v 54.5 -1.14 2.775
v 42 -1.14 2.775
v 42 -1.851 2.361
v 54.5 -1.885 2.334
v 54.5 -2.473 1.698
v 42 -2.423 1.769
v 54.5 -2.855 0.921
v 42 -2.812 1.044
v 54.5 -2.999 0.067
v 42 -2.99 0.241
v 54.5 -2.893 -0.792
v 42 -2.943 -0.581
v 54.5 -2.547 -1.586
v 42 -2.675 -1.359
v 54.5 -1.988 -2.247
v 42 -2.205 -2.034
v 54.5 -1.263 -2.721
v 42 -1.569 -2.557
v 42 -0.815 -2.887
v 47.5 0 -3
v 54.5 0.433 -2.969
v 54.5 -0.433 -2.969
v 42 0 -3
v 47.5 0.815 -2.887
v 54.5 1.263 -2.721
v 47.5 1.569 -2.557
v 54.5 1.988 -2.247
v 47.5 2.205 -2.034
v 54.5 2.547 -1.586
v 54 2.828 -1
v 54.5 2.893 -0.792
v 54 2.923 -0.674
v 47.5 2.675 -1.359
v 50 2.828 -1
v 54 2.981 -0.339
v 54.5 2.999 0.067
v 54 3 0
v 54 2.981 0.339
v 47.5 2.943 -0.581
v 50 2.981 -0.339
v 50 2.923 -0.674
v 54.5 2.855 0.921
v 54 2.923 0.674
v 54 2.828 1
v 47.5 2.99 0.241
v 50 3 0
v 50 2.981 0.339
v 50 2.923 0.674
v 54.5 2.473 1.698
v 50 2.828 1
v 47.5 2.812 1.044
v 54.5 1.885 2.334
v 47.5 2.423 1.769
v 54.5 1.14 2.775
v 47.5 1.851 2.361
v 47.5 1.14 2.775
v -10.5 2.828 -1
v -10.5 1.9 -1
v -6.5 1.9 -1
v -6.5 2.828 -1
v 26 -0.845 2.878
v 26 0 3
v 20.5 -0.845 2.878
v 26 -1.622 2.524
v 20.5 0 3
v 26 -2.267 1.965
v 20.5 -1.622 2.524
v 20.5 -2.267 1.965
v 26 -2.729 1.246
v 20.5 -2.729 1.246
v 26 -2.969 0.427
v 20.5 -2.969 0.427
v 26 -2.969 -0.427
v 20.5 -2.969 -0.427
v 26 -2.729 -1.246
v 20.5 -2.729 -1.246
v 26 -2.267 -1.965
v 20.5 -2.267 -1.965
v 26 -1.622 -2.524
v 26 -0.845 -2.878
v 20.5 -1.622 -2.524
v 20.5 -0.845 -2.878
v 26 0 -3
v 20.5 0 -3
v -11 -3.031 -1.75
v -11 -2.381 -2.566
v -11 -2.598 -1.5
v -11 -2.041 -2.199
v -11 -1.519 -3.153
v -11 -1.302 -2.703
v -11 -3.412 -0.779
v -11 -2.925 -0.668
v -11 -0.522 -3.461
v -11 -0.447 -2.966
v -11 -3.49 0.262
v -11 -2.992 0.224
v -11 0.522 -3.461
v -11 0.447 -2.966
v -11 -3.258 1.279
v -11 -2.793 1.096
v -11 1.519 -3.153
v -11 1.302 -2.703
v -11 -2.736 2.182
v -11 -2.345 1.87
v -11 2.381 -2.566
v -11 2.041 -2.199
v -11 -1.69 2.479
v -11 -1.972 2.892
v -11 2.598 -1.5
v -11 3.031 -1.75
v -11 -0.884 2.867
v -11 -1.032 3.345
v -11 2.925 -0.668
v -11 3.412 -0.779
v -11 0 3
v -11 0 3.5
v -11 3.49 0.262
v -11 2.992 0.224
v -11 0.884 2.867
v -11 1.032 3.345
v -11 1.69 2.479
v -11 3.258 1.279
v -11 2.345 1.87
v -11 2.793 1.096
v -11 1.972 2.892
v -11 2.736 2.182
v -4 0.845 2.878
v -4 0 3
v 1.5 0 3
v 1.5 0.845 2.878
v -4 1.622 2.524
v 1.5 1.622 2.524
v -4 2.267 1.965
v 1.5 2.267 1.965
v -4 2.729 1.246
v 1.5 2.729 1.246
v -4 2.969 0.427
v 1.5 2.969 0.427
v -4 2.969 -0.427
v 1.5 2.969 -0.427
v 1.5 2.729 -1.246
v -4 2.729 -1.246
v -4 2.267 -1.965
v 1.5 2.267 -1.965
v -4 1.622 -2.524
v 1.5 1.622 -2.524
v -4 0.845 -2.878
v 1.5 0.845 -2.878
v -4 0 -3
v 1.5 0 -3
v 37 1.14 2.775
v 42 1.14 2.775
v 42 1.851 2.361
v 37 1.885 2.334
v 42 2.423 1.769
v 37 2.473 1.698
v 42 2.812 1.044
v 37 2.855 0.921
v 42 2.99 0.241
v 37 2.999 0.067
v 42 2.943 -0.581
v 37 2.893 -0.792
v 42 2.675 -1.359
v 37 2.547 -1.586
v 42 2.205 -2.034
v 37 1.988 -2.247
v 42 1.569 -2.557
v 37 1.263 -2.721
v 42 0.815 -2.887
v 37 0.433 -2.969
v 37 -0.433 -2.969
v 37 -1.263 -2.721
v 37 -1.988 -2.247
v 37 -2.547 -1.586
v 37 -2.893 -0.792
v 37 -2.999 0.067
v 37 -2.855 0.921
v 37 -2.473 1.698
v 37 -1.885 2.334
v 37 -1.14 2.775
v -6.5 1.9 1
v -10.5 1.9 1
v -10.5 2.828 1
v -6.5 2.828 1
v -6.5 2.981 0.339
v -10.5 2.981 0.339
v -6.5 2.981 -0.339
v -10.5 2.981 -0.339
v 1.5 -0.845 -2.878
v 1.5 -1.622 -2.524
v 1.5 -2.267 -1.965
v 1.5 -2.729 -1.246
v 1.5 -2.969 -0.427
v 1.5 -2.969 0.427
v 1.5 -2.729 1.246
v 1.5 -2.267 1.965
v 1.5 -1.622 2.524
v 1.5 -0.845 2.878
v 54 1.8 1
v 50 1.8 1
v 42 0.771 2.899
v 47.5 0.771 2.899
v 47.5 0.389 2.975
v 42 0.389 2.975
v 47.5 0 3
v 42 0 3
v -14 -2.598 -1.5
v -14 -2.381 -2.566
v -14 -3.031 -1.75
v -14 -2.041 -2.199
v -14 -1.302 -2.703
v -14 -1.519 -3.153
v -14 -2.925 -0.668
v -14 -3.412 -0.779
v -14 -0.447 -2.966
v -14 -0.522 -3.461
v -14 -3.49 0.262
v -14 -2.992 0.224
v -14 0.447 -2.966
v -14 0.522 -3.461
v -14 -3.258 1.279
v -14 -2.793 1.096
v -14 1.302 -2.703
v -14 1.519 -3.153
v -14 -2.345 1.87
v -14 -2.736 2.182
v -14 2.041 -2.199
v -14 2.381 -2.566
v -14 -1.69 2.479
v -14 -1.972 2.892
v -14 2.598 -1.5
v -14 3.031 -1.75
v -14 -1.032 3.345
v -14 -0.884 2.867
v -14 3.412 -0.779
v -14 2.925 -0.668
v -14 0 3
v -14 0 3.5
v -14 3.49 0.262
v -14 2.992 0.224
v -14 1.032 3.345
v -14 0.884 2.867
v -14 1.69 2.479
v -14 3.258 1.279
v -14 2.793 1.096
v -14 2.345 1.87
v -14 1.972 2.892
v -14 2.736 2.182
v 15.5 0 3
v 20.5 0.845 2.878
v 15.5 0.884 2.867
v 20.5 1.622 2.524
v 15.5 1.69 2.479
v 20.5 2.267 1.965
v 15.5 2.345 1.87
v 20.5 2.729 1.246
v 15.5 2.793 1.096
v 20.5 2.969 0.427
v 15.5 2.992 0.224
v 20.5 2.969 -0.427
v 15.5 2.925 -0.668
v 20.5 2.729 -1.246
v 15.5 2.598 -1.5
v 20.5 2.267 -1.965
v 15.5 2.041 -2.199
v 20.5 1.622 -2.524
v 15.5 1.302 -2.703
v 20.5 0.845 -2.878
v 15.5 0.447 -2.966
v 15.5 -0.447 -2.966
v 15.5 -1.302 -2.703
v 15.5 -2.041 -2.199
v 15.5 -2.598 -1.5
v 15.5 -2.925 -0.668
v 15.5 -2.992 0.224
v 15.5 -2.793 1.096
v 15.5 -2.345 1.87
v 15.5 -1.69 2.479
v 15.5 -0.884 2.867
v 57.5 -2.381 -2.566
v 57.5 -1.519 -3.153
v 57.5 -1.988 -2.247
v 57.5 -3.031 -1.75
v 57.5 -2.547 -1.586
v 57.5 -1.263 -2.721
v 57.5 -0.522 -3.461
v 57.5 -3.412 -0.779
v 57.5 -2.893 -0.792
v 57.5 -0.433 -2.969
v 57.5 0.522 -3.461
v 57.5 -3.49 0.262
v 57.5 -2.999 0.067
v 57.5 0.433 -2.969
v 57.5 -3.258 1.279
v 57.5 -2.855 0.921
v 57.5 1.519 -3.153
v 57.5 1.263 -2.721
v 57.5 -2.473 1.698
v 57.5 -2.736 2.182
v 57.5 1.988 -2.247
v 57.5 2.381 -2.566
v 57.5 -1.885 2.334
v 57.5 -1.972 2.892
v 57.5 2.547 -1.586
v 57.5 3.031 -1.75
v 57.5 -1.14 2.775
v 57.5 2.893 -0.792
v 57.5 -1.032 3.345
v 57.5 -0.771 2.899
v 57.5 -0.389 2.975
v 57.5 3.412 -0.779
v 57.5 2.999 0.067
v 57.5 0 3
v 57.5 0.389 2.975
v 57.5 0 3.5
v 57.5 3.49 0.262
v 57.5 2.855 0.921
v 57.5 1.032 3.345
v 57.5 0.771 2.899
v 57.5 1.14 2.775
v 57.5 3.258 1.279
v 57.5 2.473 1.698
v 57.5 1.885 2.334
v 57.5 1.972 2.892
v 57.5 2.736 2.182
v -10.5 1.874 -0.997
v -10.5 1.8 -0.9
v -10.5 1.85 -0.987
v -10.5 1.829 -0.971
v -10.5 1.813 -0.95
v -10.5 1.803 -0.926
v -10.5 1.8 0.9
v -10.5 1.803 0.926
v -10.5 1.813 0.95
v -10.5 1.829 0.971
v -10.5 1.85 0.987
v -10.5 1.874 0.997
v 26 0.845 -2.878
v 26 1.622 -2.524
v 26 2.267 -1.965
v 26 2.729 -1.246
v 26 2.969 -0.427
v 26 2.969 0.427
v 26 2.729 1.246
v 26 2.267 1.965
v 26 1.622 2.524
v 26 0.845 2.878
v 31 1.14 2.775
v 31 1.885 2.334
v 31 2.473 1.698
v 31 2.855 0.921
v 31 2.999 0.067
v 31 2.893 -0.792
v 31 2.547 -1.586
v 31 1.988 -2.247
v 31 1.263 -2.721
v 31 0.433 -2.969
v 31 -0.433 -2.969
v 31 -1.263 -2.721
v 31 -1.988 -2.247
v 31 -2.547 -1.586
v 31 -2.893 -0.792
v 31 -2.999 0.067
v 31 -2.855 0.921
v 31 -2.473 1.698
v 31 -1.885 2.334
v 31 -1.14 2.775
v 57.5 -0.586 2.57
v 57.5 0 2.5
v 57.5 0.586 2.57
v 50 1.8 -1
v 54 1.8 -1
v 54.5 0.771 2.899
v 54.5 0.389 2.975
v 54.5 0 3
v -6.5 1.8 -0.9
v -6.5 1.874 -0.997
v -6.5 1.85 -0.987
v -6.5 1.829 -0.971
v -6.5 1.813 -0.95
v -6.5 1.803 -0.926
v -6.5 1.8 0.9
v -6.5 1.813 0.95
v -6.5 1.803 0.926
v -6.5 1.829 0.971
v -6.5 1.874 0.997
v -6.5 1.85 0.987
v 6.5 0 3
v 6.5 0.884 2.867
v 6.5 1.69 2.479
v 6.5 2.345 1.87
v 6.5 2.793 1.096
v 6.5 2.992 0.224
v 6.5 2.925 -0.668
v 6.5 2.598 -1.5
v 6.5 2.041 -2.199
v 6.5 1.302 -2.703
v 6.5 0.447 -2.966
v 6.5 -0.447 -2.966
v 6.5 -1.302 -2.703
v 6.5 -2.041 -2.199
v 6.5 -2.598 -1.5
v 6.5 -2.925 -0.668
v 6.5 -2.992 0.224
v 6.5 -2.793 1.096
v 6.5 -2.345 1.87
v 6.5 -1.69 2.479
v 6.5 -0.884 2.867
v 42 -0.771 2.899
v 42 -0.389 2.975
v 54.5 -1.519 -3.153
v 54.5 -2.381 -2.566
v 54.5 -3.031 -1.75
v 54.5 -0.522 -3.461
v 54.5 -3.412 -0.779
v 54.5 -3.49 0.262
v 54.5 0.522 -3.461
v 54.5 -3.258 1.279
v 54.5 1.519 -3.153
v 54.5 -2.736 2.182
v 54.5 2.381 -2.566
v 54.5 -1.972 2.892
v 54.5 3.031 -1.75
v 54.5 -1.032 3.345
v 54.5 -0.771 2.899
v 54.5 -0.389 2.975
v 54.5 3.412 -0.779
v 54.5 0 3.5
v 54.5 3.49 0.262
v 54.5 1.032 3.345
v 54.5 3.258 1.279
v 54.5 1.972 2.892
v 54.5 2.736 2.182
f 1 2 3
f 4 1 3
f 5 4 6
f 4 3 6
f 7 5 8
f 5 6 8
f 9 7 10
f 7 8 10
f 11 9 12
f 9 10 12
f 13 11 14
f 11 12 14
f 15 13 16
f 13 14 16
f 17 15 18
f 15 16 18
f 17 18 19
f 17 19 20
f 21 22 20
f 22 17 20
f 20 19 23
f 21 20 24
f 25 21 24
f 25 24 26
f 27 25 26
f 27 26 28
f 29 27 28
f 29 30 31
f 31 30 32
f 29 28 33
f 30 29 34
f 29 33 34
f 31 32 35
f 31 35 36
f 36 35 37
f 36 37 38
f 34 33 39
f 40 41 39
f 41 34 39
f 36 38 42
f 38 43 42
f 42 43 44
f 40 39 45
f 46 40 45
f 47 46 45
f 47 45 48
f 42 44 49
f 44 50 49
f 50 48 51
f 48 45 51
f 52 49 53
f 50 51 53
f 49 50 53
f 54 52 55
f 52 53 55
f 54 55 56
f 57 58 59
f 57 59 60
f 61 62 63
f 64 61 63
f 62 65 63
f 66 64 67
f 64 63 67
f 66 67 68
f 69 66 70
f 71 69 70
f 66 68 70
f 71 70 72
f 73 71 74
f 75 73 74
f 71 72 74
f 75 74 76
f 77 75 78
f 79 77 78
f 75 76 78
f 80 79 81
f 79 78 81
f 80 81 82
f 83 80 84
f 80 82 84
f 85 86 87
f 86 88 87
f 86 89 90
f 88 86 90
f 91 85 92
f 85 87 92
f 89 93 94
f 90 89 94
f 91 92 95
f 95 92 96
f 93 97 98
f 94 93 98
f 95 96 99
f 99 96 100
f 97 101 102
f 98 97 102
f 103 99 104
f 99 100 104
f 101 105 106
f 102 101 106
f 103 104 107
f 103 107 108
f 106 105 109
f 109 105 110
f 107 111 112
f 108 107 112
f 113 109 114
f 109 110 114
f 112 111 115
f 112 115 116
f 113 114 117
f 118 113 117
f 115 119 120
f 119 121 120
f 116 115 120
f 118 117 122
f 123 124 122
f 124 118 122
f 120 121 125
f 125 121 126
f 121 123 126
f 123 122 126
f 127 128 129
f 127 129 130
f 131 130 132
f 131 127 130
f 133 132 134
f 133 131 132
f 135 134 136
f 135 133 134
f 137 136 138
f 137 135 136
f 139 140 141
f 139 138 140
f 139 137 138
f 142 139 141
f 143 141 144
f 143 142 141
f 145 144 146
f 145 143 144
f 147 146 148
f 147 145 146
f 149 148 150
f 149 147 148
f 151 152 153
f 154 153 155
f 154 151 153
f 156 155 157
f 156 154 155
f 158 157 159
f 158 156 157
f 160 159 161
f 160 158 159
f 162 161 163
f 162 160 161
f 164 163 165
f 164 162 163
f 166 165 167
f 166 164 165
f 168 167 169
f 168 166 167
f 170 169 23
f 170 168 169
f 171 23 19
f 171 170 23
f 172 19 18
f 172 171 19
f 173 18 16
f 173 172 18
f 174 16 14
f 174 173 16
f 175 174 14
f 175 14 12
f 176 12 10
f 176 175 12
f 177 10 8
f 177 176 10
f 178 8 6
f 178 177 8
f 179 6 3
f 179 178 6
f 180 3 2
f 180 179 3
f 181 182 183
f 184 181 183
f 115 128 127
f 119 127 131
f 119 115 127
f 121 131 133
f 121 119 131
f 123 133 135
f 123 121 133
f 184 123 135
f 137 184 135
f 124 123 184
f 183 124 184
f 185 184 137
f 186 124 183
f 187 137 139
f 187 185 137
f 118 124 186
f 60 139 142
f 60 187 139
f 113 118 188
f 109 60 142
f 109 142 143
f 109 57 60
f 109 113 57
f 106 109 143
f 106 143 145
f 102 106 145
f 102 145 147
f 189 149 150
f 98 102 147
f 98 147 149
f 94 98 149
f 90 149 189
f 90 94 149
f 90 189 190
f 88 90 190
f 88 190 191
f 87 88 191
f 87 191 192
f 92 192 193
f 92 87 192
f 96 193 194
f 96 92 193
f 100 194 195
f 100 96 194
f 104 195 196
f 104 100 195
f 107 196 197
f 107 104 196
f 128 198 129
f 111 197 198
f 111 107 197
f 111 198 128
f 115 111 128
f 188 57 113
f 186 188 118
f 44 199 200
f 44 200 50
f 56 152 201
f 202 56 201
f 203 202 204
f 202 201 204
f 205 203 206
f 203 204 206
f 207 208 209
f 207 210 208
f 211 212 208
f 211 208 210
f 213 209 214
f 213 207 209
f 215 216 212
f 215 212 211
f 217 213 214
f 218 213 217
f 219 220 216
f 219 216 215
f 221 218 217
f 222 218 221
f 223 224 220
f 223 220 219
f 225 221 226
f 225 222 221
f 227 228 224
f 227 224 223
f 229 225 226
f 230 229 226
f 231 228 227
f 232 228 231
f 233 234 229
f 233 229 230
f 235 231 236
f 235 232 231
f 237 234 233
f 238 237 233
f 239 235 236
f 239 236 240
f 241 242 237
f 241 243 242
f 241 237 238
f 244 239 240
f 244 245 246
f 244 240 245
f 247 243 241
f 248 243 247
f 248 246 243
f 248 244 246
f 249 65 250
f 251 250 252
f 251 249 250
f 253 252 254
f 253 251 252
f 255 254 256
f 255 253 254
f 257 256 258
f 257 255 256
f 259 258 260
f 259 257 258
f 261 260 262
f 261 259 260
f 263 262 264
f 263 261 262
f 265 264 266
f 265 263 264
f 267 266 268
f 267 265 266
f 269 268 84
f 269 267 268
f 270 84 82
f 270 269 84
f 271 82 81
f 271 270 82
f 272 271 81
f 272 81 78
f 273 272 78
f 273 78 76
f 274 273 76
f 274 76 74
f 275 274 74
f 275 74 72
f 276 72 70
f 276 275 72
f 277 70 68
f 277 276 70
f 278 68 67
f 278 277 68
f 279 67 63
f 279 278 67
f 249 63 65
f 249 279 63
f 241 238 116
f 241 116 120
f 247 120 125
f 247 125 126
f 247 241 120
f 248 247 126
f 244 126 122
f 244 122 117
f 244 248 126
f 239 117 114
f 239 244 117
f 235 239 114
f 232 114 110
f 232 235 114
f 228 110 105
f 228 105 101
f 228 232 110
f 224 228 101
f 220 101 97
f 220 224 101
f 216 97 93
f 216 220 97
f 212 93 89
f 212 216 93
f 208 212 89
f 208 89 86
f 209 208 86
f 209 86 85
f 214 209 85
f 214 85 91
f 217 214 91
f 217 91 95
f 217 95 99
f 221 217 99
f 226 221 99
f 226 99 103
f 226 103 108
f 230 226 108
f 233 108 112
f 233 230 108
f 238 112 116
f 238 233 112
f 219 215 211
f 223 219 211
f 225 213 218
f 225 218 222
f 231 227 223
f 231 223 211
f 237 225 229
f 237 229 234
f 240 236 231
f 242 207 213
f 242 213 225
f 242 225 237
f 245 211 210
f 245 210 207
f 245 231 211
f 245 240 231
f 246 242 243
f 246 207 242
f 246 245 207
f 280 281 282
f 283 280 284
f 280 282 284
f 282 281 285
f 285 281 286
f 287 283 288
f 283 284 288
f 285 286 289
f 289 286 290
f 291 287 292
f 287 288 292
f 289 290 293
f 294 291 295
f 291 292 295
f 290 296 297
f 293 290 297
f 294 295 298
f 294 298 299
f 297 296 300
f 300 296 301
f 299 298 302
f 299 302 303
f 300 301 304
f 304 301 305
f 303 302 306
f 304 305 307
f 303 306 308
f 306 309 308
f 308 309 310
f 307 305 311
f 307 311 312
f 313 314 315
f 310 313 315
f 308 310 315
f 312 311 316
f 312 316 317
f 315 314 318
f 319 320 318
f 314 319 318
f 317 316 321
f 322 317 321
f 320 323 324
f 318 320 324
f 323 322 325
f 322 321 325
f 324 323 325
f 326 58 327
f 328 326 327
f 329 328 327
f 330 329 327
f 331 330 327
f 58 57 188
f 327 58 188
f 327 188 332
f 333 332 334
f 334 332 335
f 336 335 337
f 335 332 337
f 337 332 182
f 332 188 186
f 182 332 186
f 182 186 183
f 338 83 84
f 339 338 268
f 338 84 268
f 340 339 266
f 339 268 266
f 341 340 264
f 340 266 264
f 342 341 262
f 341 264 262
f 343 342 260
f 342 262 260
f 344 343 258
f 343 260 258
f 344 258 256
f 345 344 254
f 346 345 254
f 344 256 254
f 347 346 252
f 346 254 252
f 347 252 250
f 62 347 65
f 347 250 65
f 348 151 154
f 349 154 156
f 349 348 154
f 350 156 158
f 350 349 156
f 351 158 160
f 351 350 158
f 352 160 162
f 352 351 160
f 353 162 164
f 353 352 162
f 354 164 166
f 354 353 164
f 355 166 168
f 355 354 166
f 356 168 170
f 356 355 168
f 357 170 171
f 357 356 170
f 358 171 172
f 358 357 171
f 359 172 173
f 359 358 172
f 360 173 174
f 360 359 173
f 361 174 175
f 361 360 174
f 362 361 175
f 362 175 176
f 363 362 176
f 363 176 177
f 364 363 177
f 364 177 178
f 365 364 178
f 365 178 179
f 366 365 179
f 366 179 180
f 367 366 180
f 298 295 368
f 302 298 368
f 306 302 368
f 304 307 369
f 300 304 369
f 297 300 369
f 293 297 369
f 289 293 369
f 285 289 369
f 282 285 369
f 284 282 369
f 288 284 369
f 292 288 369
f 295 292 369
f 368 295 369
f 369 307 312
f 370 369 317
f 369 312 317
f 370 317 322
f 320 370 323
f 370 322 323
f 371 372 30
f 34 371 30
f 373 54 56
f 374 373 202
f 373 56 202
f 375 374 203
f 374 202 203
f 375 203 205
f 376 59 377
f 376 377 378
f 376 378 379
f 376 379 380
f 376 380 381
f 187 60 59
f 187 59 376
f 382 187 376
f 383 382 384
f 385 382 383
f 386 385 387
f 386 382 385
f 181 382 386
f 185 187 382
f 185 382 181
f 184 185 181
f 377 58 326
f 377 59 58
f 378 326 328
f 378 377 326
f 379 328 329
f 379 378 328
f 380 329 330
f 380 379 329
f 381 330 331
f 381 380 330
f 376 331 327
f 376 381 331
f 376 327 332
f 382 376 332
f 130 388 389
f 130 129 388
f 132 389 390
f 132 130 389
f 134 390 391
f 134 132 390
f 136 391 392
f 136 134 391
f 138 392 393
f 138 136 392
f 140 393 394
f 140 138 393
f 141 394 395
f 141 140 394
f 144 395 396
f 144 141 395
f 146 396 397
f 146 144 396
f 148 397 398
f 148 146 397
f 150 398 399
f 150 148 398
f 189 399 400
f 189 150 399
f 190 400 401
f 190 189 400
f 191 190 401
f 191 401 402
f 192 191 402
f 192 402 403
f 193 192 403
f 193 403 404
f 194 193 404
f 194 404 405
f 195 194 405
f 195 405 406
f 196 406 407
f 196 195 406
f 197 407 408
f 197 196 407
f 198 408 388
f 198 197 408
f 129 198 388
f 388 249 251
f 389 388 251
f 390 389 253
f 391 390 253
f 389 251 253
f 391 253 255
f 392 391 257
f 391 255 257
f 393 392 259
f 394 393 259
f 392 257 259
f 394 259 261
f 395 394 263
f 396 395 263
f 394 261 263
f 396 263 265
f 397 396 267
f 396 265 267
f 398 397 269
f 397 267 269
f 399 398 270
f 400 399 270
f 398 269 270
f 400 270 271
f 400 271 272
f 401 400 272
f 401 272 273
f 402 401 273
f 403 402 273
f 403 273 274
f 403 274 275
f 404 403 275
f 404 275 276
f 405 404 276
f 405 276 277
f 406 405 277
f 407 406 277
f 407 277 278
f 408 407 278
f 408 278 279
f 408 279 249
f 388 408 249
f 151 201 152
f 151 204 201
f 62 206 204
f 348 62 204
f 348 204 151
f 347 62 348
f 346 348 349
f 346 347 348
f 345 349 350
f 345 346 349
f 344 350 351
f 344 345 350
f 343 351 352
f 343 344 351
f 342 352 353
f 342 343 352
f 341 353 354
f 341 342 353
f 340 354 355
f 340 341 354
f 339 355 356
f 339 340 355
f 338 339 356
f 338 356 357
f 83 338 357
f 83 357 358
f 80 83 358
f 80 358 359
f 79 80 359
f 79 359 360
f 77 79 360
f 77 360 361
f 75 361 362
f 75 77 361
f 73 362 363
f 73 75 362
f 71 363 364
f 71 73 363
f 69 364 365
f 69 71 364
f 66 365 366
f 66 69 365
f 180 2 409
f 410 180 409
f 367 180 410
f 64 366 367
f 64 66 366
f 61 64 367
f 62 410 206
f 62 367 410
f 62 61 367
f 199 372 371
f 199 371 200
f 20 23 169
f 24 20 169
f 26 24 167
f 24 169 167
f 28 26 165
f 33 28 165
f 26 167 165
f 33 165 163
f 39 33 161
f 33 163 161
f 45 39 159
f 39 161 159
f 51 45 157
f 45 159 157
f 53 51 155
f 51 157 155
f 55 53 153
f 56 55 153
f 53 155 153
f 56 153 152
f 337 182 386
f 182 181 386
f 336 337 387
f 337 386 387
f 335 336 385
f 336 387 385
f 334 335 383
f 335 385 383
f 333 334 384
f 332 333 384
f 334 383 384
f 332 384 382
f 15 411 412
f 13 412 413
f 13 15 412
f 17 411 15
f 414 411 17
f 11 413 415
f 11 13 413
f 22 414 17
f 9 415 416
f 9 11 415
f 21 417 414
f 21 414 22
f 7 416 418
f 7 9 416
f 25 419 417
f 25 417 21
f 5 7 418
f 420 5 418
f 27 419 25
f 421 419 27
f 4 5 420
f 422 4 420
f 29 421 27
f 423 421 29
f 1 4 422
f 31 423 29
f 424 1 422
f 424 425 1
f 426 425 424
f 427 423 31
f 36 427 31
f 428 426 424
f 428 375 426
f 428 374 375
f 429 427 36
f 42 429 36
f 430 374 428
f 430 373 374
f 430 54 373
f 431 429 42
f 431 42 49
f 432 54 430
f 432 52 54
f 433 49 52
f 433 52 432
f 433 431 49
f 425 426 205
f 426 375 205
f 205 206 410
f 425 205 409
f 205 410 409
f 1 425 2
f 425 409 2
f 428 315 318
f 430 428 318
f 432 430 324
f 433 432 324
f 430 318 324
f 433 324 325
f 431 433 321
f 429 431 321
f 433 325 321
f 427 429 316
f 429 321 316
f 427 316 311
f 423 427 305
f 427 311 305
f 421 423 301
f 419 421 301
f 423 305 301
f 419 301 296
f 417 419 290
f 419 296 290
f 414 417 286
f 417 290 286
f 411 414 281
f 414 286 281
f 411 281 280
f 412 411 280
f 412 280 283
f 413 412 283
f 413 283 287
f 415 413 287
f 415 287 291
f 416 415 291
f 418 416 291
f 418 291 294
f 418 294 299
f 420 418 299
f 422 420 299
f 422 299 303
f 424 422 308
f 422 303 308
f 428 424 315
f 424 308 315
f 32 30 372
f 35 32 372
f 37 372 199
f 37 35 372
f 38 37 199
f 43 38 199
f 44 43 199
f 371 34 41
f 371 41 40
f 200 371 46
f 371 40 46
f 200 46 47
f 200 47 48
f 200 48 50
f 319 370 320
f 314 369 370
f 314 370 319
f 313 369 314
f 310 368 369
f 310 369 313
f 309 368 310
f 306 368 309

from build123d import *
from build123d.topology import SkipClean

# Parameters (mm, degrees)
SKETCH_2_R          = 3
EXTRUDE_1_DEPTH     = 4
EXTRUDE_2_DEPTH     = 2.5
SKETCH_5_R          = 2.5
EXTRUDE_3_DEPTH     = 9
MIRROR_START        = 15.5
MIRROR_1_DEPTH      = 0.381197772
MIRROR_START_2      = 15.881197772
MIRROR_1_2_DEPTH    = 4.618802228
EXTRUDE_4_DEPTH     = 5
SKETCH_10_R         = 2.5
EXTRUDE_5_DEPTH     = 6
SKETCH_11_R         = 3
EXTRUDE_6_DEPTH     = 5.5
EXTRUDE_START       = 10
SKETCH_12_R         = 3
EXTRUDE_8_DEPTH     = 10
SKETCH_13_R         = 3
EXTRUDE_9_DEPTH     = 10
SKETCH_14_OUTSIDE_W = 32.048
SKETCH_14_OUTSIDE_H = 35.048
SKETCH_14_OUTSIDE_R = 3
CUT_EXTRUDE_2_DEPTH = 59.352377883
SKETCH_15_R         = 3
EXTRUDE_10_DEPTH    = 29.5
EXTRUDE_11_DEPTH    = 26.5
CUT_EXTRUDE_START   = -3.5
SKETCH_17_W         = 2
SKETCH_17_H         = 1.2
CUT_EXTRUDE_3_DEPTH = 4
FILLET_1_R          = 0.1
SKETCH_18_R         = 3.5
EXTRUDE_12_DEPTH    = 3


with BuildPart() as part:
    # 草图2 → 凸台-拉伸1 (new, symmetric)
    with BuildSketch(Plane(origin=(0, 0, 0), x_dir=(0, 0, -1), z_dir=(1, 0, 0))):
        Circle(SKETCH_2_R)
    extrude_1 = extrude(amount=EXTRUDE_1_DEPTH, both=True)

    # 草图3 → 凸台-拉伸2 (add, symmetric)
    with BuildSketch(Plane(origin=(4, 0, 0), x_dir=(0, 0, -1), z_dir=(1, 0, 0))):
        with BuildLine():
            Line((5, 0), (5, -8))
            ThreePointArc((5, -8), (0, -13), (-5, -8))
            Line((-5, -8), (-5, 0))
            ThreePointArc((-5, 0), (0, 5), (5, 0))
        make_face()
    extrude(amount=EXTRUDE_2_DEPTH, both=True)

    # 切除-旋转1: read off the stored shape, not the designer's step
    # 切除-旋转1 outline → 切除-旋转1 (revolve, cut)
    with BuildSketch(Plane.YX):
        Polygon((13.0002322, 6.118936215), (4.99999958, 1.499999757), (13.0002322, 1.499999757), align=None)
    revolve(axis=Axis((0, 0, 0), (1, 0, 0)), mode=Mode.SUBTRACT)

    # 草图5 → 凸台-拉伸3 (add)
    with BuildSketch(Plane(origin=(6.5, 0, 0), x_dir=(0, 0, -1), z_dir=(1, 0, 0))):
        with Locations((0, -8)):
            Circle(SKETCH_5_R)
    extrude(amount=EXTRUDE_3_DEPTH)

    # 镜向1: read off the stored shape, not the designer's step
    # 镜向1 outline → 镜向1 (add)
    with BuildSketch(Plane.YZ.offset(MIRROR_START)):
        with BuildLine():
            Line((-8, -5), (0, -5))
            ThreePointArc((0, -5), (5, 0), (0, 5))
            Line((0, 5), (-7.999999997, 5))
            ThreePointArc((-7.999999997, 5), (-13, 2e-09), (-8, -5))
        make_face()
    extrude(amount=MIRROR_1_DEPTH)

    # Mirror 1 2 outline → Mirror 1 2 (add)
    with BuildSketch(Plane.YZ.offset(MIRROR_START_2)):
        with BuildLine():
            Line((-8, -5), (0, -5))
            ThreePointArc((0, -5), (5, 0), (0, 5))
            Line((0, 5), (-7.999999997, 5))
            ThreePointArc((-7.999999997, 5), (-13, 2e-09), (-8, -5))
        make_face()
    extrude(amount=MIRROR_1_2_DEPTH)

    # Mirror 1 3 outline → Mirror 1 3 (revolve, cut)
    with BuildSketch(Plane.YX):
        Polygon((13.0002322, 20.500000243), (4.99999958, 20.500000243), (13.0002322, 15.881063785), align=None)
    revolve(axis=Axis((0, 0, 0), (1, 0, 0)), mode=Mode.SUBTRACT)

    # 镜向2: 凸台-拉伸1 across plane
    add(extrude_1.mirror(Plane(origin=(11, 0, 0), x_dir=(0, 0, 1), z_dir=(1, 0, 0))))

    # 草图6 → 凸台-拉伸4 (add)
    with BuildSketch(Plane(origin=(26, 0, 0), x_dir=(0, 0, -1), z_dir=(1, 0, 0))):
        with BuildLine():
            Line((0, -5), (-5, -5))
            ThreePointArc((-5, -5), (-10, 0), (-5, 5))
            Line((-5, 5), (0, 5))
            ThreePointArc((0, 5), (5, 0), (0, -5))
        make_face()
    extrude_4 = extrude(amount=EXTRUDE_4_DEPTH)

    # 切除-旋转2: read off the stored shape, not the designer's step
    # 切除-旋转2 outline → 切除-旋转2 (revolve, cut)
    with BuildSketch(Plane.YX):
        Polygon((10.000264544, 30.195720135), (5, 26), (10.000264544, 26), align=None)
    cut_revolve_2 = revolve(axis=Axis((0, 0, 0), (1, 0, 0)), mode=Mode.SUBTRACT)

    # 草图10 → 凸台-拉伸5 (add)
    with BuildSketch(Plane(origin=(31, 0, 0), x_dir=(0, 0, -1), z_dir=(1, 0, 0))):
        with Locations((-5, 0)):
            Circle(SKETCH_10_R)
    extrude(amount=EXTRUDE_5_DEPTH)

    # 镜向3: 凸台-拉伸4, 切除-旋转2 across plane
    add(extrude_4.mirror(Plane(origin=(34, 0, 0), x_dir=(0, 0, 1), z_dir=(1, 0, 0))))
    add(cut_revolve_2.mirror(Plane(origin=(34, 0, 0), x_dir=(0, 0, 1), z_dir=(1, 0, 0))), mode=Mode.SUBTRACT)

    # 草图11 → 凸台-拉伸6 (add)
    with BuildSketch(Plane(origin=(42, 0, 0), x_dir=(0, 0, -1), z_dir=(1, 0, 0))):
        Circle(SKETCH_11_R)
    extrude(amount=EXTRUDE_6_DEPTH)

    # 草图12 → 凸台-拉伸8 (add)
    with BuildSketch(Plane.ZY.offset(4).offset(EXTRUDE_START)):
        Circle(SKETCH_12_R)
    extrude(amount=-EXTRUDE_8_DEPTH)

    # 草图13 → 凸台-拉伸9 (add)
    with BuildSketch(Plane(origin=(47.5, 0, 0), x_dir=(0, 0, -1), z_dir=(1, 0, 0))):
        with Locations(Location((0, 0, 0), (0, 0, 180))):
            Circle(SKETCH_13_R)
    extrude(amount=EXTRUDE_9_DEPTH)

    # 草图14 outside → 切除-拉伸2 (cut, through all)
    with SkipClean():  # the faces are left unmerged after this step: merging them gives an invalid solid
        with BuildSketch(Plane.ZY.offset(-1.5)):
            with Locations((2.5, -4)):
                Rectangle(SKETCH_14_OUTSIDE_W, SKETCH_14_OUTSIDE_H)
            Circle(SKETCH_14_OUTSIDE_R, mode=Mode.SUBTRACT)
        extrude(amount=-CUT_EXTRUDE_2_DEPTH, mode=Mode.SUBTRACT)


with BuildPart() as cut_extrude_2_piece_1:
    # of the separate pieces the step leaves, piece 1, a body of its own (cut_extrude_2_pieces)
    add(part.part.solids().sort_by_distance((37, -1.139901312, 2.775))[0])



with BuildPart() as cut_extrude_2_piece_2:
    # of the separate pieces the step leaves, piece 2, a body of its own (cut_extrude_2_pieces)
    add(part.part.solids().sort_by_distance((6.5, 0, 3))[0])


with BuildPart() as cut_extrude_2_piece_1_1:
    with SkipClean():  # the faces are left unmerged after this step: merging them gives an invalid solid
        add(cut_extrude_2_piece_1.part)

        add(cut_extrude_2_piece_2.part)  # 凸台-拉伸10 merges 切除-拉伸2 piece 2
        # 草图15 → 凸台-拉伸10 (add)
        with BuildSketch(Plane.ZY.offset(-15.5)):
            Circle(SKETCH_15_R)
        extrude(amount=EXTRUDE_10_DEPTH)

    # 草图16 → 凸台-拉伸11 (add)
    with BuildSketch(Plane(origin=(31, 0, 0), x_dir=(0, 0, -1), z_dir=(1, 0, 0))):
        with BuildLine():
            ThreePointArc((-2.775, -1.139901312), (-2.5, 0), (-2.775, 1.139901312))
            ThreePointArc((-2.775, 1.139901312), (3, 0), (-2.775, -1.139901312))
        make_face()
    extrude(amount=EXTRUDE_11_DEPTH)

    # 草图17 → 切除-拉伸3 (cut)
    with SkipClean():  # the faces are left unmerged after this step: merging them gives an invalid solid
        with BuildSketch(Plane.ZY.offset(14).offset(CUT_EXTRUDE_START)):
            with Locations((0, 2.4)):
                Rectangle(SKETCH_17_W, SKETCH_17_H)
        cut_extrude_3 = extrude(amount=-CUT_EXTRUDE_3_DEPTH, mode=Mode.SUBTRACT)

    # 圆角1
    fillet_1_edges = [cut_extrude_2_piece_1_1.edges().sort_by_distance(p)[0] for p in [
        (-8.5, 1.8, 1),
        (-8.5, 1.8, -1),
    ]]
    fillet(fillet_1_edges, radius=FILLET_1_R)

    # 镜向4: 切除-拉伸3 across plane
    with SkipClean():  # the faces are left unmerged after this step: merging them gives an invalid solid
        add(cut_extrude_3.mirror(Plane.ZY.offset(-21.75)), mode=Mode.SUBTRACT)

    # 草图18 → 凸台-拉伸12 (add)
    with SkipClean():  # the faces are left unmerged after this step: merging them gives an invalid solid
        with BuildSketch(Plane.ZY.offset(14)):
            Circle(SKETCH_18_R)
        extrude_12 = extrude(amount=-EXTRUDE_12_DEPTH)

    # 镜向5: 凸台-拉伸12 across plane
    with SkipClean():  # the faces are left unmerged after this step: merging them gives an invalid solid
        add(extrude_12.mirror(Plane.ZY.offset(-21.75)))


solid = cut_extrude_2_piece_1_1.part
